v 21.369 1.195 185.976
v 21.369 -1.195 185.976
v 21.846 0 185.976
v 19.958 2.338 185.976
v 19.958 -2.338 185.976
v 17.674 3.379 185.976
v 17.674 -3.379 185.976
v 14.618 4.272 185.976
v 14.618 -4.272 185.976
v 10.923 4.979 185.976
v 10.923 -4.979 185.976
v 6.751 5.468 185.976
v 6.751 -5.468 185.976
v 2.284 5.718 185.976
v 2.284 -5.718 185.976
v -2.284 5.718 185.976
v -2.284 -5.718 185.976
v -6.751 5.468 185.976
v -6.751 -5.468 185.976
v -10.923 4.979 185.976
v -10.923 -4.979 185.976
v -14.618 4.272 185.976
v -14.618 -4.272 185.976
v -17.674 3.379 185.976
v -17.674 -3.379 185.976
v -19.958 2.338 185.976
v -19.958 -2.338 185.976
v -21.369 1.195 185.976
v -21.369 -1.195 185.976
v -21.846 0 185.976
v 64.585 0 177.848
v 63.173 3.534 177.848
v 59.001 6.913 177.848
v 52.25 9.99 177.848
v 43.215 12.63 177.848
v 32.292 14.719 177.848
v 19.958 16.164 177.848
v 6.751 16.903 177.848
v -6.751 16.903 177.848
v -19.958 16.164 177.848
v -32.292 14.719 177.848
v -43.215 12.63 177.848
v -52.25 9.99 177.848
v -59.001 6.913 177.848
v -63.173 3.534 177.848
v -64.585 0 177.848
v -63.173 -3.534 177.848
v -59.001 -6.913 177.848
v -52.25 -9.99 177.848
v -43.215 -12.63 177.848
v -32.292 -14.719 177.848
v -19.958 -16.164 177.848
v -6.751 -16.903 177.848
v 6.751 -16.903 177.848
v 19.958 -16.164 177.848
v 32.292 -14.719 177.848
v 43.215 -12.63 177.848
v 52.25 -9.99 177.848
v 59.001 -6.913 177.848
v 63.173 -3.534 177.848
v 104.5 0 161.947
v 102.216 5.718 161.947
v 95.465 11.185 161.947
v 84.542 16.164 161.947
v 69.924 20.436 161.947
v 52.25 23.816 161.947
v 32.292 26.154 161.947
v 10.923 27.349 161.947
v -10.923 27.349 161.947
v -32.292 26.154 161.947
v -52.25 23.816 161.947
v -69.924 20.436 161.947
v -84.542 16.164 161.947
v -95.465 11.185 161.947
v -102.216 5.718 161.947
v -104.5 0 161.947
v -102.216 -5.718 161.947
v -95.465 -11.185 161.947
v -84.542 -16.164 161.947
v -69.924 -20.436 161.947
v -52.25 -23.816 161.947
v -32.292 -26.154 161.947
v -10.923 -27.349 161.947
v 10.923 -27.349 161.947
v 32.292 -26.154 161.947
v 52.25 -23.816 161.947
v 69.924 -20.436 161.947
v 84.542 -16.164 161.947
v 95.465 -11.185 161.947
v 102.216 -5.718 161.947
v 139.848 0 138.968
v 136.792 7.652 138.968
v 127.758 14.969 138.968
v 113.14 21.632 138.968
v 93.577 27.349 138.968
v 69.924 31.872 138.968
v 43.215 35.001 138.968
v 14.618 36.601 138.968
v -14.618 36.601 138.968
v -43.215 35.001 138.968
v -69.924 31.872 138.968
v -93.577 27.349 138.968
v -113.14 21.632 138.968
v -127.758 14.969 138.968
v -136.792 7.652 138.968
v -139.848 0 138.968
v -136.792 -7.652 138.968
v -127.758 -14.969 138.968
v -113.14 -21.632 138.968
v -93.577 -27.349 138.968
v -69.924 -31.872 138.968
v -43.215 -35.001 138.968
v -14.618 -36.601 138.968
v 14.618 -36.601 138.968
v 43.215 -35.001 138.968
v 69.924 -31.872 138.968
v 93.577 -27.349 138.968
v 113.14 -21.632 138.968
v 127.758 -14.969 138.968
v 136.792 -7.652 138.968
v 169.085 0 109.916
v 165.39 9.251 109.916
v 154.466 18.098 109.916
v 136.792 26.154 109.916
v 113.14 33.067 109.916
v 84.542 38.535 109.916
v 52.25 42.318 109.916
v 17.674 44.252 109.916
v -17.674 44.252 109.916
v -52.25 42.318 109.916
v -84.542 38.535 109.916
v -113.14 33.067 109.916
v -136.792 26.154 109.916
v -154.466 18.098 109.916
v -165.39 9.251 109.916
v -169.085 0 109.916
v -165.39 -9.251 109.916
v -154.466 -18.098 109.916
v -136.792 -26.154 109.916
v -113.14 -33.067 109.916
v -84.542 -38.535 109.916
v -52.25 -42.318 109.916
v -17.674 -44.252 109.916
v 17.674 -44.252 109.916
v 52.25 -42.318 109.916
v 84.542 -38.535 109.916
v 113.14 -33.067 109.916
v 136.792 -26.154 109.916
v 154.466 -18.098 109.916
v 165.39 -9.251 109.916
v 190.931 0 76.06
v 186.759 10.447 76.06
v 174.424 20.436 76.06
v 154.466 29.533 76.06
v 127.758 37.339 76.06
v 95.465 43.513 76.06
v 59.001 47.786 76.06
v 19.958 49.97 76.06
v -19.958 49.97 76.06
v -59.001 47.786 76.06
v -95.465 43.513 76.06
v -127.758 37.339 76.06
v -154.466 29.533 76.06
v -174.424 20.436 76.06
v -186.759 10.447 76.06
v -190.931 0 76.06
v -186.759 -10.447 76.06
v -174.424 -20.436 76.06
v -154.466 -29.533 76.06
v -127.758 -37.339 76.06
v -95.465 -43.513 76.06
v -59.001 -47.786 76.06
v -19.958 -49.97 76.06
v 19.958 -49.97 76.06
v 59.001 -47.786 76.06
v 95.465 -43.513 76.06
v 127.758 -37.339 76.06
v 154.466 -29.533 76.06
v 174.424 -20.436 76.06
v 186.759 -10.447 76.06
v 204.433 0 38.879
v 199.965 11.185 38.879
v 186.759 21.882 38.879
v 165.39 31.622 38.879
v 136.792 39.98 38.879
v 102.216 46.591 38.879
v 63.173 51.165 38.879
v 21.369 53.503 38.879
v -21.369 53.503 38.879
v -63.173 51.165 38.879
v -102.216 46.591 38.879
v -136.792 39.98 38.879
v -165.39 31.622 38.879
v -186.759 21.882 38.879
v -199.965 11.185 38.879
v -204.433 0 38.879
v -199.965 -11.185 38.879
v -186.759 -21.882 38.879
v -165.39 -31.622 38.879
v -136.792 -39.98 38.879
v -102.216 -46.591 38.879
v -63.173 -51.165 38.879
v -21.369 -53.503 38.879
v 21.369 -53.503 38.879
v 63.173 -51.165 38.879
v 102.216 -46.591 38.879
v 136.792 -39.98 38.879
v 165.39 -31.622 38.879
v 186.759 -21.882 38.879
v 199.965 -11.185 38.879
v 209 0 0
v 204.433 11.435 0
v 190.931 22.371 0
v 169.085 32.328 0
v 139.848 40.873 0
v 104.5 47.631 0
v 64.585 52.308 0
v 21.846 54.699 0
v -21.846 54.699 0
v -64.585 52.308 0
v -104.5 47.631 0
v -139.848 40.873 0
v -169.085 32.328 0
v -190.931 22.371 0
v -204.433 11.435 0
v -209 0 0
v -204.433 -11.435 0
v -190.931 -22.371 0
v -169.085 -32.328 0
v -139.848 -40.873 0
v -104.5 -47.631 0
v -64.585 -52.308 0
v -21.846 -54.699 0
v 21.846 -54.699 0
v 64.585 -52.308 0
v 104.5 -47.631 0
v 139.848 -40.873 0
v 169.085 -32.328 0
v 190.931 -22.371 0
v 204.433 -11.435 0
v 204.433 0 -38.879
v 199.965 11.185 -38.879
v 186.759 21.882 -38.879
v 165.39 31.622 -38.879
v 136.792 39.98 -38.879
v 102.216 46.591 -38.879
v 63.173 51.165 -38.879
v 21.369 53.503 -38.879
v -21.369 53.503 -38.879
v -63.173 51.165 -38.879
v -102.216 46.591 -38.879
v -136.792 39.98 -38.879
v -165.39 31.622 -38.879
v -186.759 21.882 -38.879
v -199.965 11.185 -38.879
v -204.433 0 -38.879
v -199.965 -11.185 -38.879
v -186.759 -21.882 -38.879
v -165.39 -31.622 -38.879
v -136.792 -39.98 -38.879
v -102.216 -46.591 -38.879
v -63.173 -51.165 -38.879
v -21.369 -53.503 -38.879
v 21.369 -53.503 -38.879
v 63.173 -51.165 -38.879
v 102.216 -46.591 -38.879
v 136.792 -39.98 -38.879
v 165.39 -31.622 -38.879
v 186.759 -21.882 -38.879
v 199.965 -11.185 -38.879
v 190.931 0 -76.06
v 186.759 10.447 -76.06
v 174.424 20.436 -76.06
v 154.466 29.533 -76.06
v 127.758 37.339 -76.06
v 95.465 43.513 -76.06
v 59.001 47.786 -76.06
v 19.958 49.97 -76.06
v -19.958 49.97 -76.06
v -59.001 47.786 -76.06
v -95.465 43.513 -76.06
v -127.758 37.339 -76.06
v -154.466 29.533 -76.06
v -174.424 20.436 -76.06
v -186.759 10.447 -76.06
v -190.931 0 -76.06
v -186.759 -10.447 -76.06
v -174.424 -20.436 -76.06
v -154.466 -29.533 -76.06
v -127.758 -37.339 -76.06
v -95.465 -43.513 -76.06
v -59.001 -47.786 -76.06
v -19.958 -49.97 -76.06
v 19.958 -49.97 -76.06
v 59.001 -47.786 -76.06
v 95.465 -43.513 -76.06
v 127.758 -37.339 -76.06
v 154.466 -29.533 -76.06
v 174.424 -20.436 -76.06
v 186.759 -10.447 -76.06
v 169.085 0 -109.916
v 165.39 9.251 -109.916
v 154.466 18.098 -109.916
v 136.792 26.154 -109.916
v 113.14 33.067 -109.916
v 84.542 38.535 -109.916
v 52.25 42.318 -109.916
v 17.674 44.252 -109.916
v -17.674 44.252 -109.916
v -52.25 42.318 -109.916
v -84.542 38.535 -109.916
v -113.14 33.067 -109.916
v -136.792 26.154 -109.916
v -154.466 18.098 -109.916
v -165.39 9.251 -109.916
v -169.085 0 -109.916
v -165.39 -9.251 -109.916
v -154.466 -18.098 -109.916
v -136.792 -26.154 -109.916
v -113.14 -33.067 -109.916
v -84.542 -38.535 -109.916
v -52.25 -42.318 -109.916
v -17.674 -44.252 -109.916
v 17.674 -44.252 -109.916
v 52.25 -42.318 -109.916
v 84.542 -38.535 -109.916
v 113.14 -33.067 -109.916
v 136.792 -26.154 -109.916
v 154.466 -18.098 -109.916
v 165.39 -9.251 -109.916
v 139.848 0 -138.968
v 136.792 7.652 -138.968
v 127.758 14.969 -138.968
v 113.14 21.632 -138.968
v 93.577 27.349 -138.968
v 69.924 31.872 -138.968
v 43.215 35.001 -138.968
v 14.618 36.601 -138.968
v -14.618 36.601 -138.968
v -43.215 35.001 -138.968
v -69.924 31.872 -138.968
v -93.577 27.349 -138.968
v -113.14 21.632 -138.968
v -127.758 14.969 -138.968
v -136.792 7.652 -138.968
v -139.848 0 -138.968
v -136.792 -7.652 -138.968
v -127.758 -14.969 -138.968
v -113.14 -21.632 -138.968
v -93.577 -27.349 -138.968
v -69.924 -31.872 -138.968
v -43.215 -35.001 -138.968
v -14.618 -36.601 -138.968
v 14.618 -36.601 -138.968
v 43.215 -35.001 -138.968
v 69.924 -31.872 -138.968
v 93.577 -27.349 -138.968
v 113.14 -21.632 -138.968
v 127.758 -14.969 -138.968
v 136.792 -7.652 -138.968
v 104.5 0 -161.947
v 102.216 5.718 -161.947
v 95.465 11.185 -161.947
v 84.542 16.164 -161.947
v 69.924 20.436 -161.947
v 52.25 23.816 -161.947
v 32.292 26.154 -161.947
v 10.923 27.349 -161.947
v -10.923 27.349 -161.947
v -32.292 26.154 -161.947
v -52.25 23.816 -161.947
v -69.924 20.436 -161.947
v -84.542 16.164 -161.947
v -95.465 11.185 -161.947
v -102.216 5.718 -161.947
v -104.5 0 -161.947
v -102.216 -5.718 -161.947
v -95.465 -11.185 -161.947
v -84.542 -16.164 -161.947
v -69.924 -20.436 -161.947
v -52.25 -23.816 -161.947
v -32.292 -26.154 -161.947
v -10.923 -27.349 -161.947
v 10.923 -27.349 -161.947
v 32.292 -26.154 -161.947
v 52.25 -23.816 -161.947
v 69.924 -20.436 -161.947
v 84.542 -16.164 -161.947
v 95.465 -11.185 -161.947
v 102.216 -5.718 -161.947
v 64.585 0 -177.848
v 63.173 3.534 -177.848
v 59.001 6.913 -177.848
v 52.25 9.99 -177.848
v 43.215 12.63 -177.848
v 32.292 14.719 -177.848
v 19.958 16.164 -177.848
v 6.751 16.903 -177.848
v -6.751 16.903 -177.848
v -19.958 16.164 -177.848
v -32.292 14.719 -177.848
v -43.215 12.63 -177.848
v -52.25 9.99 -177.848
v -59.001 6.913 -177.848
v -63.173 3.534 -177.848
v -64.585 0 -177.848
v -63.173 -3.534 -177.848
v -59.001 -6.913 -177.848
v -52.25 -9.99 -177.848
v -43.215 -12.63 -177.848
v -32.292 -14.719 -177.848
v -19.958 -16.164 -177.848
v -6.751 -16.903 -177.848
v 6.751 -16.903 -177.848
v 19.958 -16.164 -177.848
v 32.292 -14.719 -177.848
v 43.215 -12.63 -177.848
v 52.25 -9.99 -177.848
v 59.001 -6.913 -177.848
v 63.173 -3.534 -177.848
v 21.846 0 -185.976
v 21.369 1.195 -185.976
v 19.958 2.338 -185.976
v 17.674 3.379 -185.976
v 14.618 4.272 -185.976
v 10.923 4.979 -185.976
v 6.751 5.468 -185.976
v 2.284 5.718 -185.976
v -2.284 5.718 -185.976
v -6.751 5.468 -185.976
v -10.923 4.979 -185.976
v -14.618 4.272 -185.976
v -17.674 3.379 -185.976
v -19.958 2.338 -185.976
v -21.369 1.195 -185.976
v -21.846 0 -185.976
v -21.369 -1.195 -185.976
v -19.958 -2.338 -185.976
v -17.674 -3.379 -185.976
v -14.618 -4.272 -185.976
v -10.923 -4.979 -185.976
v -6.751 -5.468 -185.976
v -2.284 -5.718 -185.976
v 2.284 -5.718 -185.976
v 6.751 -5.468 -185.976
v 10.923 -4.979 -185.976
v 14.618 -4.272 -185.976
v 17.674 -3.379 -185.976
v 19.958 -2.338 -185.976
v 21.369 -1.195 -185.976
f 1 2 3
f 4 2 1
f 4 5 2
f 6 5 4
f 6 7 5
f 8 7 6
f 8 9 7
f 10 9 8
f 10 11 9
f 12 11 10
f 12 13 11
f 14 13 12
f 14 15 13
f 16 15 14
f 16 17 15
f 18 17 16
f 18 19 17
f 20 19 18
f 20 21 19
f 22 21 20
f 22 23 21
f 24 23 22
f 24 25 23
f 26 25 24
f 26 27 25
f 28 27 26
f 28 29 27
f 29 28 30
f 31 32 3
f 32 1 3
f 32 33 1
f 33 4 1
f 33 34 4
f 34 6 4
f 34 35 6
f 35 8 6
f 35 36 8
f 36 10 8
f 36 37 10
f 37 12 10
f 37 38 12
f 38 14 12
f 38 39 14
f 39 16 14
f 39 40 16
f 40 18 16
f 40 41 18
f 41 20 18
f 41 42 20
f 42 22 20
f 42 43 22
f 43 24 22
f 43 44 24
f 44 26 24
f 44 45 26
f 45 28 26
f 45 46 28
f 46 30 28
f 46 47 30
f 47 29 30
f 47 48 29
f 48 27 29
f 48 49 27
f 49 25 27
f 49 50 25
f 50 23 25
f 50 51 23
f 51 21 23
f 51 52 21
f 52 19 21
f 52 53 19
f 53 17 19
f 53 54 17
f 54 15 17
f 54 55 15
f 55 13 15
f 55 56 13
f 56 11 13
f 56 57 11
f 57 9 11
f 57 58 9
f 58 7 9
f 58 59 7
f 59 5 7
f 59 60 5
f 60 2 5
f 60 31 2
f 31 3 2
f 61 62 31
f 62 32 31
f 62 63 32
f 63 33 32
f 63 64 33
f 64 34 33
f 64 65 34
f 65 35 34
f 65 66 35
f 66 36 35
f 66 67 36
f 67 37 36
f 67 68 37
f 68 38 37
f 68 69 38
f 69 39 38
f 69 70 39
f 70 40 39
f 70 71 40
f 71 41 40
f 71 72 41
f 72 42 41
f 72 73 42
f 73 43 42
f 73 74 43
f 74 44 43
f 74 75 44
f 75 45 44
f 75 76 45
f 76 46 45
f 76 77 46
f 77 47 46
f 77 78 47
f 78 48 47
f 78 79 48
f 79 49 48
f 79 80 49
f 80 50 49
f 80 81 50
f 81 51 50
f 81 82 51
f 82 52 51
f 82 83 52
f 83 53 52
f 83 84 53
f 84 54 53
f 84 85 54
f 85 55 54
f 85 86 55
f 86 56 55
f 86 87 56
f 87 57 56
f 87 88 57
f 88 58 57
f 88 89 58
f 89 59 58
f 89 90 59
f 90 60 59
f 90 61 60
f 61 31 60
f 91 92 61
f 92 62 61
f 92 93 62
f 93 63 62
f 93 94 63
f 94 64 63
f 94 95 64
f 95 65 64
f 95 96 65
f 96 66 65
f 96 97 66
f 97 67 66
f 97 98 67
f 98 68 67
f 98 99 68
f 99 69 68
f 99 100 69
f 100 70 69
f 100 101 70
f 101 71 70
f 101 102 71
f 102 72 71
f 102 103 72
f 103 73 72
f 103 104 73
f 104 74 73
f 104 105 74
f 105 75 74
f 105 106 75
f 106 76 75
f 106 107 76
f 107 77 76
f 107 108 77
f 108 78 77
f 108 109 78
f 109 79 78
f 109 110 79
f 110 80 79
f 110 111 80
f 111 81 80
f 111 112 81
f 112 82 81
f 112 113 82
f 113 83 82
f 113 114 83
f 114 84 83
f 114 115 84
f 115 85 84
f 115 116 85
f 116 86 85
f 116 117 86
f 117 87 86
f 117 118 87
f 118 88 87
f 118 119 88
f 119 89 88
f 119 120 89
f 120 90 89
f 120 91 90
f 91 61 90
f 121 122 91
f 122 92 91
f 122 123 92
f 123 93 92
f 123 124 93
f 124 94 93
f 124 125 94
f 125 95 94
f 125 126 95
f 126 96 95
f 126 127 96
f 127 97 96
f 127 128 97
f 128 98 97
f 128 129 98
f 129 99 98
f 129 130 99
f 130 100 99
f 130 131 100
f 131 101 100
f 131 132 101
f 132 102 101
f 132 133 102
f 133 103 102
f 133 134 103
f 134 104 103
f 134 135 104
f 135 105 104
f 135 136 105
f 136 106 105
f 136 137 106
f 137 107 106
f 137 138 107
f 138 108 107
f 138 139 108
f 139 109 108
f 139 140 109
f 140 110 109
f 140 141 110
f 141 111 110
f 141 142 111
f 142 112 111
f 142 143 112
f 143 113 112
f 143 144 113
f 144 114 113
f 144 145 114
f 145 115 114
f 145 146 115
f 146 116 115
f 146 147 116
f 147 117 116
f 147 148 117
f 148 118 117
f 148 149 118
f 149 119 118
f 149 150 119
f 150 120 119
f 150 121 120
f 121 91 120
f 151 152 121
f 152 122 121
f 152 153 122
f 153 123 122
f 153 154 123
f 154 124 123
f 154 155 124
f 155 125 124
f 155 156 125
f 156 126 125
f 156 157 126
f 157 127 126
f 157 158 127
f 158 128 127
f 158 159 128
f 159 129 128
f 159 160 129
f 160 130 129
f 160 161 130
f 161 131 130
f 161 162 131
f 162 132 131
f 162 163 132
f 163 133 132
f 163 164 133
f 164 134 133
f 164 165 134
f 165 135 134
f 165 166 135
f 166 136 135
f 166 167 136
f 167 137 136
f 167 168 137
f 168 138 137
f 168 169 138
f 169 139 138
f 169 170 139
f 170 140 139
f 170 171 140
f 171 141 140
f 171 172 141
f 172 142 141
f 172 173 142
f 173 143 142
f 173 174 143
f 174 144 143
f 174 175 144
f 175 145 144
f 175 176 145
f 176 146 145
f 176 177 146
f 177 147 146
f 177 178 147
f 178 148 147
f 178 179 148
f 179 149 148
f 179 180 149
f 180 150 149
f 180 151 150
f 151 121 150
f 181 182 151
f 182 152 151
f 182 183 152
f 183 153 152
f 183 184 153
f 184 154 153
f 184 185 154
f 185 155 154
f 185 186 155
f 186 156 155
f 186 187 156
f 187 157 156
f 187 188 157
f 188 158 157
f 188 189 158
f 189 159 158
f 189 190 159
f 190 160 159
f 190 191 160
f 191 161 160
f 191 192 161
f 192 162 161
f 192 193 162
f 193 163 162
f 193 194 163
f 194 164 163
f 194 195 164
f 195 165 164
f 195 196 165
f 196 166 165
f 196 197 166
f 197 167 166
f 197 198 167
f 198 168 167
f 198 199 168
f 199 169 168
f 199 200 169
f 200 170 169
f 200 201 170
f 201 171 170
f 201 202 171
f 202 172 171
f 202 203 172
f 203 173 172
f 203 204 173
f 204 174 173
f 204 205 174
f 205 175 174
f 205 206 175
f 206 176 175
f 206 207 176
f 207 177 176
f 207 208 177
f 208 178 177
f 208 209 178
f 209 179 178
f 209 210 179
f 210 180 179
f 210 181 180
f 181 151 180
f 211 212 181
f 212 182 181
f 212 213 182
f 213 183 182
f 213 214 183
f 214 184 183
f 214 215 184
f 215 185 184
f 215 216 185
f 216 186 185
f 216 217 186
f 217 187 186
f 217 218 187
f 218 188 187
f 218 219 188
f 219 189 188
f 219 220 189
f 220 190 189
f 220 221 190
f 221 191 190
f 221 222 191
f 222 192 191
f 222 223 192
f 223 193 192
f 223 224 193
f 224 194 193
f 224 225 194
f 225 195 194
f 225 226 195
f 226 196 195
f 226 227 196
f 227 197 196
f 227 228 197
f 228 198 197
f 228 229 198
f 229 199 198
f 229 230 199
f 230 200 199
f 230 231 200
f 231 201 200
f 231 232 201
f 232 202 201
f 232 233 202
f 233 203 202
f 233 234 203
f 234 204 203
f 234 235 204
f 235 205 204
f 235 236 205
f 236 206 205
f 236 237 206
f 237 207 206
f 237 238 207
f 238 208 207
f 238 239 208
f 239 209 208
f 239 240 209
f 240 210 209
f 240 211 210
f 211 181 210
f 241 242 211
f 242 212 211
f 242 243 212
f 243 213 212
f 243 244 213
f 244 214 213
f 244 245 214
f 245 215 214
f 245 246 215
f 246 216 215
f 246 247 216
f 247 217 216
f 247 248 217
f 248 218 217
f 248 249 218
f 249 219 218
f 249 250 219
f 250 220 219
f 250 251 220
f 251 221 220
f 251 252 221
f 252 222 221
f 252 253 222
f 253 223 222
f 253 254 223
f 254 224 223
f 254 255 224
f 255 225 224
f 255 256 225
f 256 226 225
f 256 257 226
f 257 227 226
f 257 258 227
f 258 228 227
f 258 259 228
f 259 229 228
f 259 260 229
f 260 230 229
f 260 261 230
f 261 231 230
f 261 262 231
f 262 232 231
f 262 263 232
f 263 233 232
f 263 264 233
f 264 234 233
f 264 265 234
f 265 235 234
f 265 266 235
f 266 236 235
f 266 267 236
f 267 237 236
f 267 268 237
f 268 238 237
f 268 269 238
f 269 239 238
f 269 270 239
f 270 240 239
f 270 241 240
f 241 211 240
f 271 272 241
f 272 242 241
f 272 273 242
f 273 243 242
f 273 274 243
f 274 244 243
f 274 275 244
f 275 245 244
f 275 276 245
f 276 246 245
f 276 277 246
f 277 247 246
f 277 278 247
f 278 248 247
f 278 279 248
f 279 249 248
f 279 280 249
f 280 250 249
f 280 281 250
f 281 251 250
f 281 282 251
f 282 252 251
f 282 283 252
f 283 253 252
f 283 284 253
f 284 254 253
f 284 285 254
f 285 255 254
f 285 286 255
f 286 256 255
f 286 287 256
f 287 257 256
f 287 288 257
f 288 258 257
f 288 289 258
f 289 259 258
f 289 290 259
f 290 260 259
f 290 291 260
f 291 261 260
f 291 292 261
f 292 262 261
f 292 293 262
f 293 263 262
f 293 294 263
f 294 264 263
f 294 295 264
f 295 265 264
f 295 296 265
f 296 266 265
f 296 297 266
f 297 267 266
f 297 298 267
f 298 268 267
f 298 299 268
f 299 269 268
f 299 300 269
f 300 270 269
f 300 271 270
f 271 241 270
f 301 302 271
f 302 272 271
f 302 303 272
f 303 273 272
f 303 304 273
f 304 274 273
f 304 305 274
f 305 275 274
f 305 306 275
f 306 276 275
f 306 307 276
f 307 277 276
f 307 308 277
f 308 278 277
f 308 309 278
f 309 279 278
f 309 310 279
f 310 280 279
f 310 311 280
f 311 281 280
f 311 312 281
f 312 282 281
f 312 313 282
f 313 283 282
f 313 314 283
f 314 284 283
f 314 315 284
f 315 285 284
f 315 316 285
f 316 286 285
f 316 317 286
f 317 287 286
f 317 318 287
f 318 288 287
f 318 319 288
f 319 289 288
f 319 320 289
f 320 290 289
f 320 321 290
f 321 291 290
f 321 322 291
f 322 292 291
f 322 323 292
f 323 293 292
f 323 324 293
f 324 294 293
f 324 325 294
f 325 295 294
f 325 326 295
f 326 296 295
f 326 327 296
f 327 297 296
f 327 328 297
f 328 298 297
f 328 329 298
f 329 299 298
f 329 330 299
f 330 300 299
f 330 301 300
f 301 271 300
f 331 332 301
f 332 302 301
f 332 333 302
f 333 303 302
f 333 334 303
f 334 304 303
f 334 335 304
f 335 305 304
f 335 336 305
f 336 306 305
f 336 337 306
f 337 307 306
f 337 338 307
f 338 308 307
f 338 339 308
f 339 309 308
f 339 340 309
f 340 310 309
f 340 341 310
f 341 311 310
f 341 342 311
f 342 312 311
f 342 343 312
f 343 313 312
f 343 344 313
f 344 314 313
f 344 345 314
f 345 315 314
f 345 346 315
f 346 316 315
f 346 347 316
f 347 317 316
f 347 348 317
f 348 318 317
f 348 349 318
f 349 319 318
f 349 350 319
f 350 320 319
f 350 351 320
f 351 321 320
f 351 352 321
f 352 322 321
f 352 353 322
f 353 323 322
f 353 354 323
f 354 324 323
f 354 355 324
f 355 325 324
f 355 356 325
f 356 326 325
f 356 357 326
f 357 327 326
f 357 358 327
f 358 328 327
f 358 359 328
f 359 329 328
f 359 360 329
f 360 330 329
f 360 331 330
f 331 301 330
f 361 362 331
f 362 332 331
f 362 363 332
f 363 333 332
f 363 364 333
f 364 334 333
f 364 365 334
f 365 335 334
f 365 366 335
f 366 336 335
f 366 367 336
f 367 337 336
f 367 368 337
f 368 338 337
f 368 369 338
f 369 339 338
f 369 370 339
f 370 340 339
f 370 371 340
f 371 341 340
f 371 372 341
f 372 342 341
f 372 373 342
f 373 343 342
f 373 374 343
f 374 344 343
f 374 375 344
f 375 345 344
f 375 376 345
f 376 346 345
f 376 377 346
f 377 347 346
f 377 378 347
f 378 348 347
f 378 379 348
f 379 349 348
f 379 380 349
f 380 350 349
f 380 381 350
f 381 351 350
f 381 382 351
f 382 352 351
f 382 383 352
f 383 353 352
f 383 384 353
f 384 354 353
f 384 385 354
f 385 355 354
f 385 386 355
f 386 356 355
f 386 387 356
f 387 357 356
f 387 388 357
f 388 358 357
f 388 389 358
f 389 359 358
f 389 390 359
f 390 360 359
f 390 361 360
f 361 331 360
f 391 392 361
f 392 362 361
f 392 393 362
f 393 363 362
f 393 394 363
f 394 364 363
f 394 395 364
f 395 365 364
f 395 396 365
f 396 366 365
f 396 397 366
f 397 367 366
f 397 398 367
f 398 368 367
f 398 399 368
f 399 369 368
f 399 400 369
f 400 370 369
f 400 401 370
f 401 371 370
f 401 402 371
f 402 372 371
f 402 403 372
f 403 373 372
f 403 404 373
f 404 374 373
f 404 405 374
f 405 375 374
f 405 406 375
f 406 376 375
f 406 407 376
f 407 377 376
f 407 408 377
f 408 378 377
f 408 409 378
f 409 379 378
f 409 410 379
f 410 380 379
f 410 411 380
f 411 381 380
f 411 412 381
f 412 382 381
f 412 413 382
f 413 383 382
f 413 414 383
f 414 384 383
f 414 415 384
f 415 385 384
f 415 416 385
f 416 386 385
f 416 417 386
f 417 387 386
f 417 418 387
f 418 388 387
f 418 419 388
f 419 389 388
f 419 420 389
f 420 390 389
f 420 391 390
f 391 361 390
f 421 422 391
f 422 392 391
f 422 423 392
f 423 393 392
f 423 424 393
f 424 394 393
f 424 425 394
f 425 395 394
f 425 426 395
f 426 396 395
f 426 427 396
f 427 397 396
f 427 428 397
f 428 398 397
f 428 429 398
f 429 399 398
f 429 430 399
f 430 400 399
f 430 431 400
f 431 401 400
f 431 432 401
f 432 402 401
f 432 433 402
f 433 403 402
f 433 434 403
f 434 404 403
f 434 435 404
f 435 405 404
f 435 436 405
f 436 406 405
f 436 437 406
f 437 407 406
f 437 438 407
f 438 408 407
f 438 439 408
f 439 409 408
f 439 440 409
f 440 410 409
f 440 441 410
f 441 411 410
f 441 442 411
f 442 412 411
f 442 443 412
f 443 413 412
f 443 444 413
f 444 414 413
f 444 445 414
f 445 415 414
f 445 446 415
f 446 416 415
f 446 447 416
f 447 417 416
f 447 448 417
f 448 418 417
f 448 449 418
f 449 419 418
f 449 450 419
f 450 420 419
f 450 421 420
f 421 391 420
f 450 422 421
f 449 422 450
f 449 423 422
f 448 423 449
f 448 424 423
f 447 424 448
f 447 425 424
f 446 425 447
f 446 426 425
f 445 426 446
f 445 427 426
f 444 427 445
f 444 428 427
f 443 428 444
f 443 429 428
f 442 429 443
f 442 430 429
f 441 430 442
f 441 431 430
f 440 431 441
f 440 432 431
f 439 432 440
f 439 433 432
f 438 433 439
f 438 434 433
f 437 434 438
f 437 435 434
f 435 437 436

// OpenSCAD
// Generated by SolidPython 1.0.1 on 2020-07-29 00:46:53


scale(v = [19, 5, 17]) {
	sphere(r = 11);
}
/***********************************************
*********      SolidPython code:      **********
************************************************
 
# import packages: SolidPython
from solid import *
from solid.utils import *
from itertools import chain, combinations, permutations


class Resize:

    def __init__(self, scad_file):
        self.scad_file = scad_file
        #self.scad_file = import_scad(scad_file)
        # cone/cylinder param:
        self.r1 = 0
        self.r2 = 0
        self.h = 0
        # rectangular prism param:
        self.w = 0
        self.l = 0
        # ellipse param:
        self.r = 0

    # import OpenScad code (file name corresponds to shape)


    # classify shape + parameters
    def assign(self, param1, param2, param3):
        if self.scad_file == 'cone.scad':
            self.r1 = param1
            self.r2 = param2
            self.h = param3
        elif self.scad_file == 'cylinder.scad':
            self.r1 = param1
            self.r2 = param2
            self.h = param3
        elif self.scad_file == 'rectangularPrism.scad':
            self.h = param1
            self.l = param2
            self.w = param3
        else:
            self.r = param1
            self.h = param2

    # resize parameters
    def iterate(self):
        x = range(3, 20, 2)
        i = 1
        if self.scad_file == 'cone.scad':
            tempList = list(permutations(x, 2))
            for temp in tempList:
                param1 = temp[0]
                param2 = temp[1]
                filepath = 'produced_scad_files/' + 'cone' + str(param1) + '_' + str(param2) + '_' + '.scad'
                scad_render_to_file(cylinder(h=param1, r1=param2, r2=0), filepath)

        elif self.scad_file == 'cylinder.scad':
            tempList = list(permutations(x, 3))
            for temp in tempList:
                param1 = temp[0]
                param2 = temp[1]
                filepath = 'produced_scad_files/' + 'cylinder' + str(param1) + '_' + str(param2) + '_' + '.scad'
                scad_render_to_file(cylinder(h=param1, r1=param2, r2=param2), filepath)

        elif self.scad_file == 'rectangularPrism.scad':
            tempList = list(permutations(x, 3))
            for temp in tempList:
                param1 = temp[0]
                param2 = temp[1]
                param3 = temp[2]
                filepath = 'produced_scad_files/' + 'rectangularPrism' + str(param1) + '_' + str(param2) + '_' + str(
                    param3) + '.scad'
                scad_render_to_file(cube(size=(param1, param2, param3)), filepath)

        elif self.scad_file == 'ellipse.scad':
            tempList = list(permutations(x, 4))
            for temp in tempList:
                param1 = temp[0]
                param2 = temp[1]
                param3 = temp[2]
                param4 = temp[3]
                filepath = 'produced_scad_files/' + 'ellipse' + str(param1) + '_' + str(param2) + '_' + str(param3) + '_' + str(param4) + '.scad'
                scad_render_to_file(scale([param1, param2, param3])(sphere(r=param4)), filepath)

    def render_to_scadfile(self):
        scad_render_to_file(scad, 'example.scad') 
 
************************************************/
